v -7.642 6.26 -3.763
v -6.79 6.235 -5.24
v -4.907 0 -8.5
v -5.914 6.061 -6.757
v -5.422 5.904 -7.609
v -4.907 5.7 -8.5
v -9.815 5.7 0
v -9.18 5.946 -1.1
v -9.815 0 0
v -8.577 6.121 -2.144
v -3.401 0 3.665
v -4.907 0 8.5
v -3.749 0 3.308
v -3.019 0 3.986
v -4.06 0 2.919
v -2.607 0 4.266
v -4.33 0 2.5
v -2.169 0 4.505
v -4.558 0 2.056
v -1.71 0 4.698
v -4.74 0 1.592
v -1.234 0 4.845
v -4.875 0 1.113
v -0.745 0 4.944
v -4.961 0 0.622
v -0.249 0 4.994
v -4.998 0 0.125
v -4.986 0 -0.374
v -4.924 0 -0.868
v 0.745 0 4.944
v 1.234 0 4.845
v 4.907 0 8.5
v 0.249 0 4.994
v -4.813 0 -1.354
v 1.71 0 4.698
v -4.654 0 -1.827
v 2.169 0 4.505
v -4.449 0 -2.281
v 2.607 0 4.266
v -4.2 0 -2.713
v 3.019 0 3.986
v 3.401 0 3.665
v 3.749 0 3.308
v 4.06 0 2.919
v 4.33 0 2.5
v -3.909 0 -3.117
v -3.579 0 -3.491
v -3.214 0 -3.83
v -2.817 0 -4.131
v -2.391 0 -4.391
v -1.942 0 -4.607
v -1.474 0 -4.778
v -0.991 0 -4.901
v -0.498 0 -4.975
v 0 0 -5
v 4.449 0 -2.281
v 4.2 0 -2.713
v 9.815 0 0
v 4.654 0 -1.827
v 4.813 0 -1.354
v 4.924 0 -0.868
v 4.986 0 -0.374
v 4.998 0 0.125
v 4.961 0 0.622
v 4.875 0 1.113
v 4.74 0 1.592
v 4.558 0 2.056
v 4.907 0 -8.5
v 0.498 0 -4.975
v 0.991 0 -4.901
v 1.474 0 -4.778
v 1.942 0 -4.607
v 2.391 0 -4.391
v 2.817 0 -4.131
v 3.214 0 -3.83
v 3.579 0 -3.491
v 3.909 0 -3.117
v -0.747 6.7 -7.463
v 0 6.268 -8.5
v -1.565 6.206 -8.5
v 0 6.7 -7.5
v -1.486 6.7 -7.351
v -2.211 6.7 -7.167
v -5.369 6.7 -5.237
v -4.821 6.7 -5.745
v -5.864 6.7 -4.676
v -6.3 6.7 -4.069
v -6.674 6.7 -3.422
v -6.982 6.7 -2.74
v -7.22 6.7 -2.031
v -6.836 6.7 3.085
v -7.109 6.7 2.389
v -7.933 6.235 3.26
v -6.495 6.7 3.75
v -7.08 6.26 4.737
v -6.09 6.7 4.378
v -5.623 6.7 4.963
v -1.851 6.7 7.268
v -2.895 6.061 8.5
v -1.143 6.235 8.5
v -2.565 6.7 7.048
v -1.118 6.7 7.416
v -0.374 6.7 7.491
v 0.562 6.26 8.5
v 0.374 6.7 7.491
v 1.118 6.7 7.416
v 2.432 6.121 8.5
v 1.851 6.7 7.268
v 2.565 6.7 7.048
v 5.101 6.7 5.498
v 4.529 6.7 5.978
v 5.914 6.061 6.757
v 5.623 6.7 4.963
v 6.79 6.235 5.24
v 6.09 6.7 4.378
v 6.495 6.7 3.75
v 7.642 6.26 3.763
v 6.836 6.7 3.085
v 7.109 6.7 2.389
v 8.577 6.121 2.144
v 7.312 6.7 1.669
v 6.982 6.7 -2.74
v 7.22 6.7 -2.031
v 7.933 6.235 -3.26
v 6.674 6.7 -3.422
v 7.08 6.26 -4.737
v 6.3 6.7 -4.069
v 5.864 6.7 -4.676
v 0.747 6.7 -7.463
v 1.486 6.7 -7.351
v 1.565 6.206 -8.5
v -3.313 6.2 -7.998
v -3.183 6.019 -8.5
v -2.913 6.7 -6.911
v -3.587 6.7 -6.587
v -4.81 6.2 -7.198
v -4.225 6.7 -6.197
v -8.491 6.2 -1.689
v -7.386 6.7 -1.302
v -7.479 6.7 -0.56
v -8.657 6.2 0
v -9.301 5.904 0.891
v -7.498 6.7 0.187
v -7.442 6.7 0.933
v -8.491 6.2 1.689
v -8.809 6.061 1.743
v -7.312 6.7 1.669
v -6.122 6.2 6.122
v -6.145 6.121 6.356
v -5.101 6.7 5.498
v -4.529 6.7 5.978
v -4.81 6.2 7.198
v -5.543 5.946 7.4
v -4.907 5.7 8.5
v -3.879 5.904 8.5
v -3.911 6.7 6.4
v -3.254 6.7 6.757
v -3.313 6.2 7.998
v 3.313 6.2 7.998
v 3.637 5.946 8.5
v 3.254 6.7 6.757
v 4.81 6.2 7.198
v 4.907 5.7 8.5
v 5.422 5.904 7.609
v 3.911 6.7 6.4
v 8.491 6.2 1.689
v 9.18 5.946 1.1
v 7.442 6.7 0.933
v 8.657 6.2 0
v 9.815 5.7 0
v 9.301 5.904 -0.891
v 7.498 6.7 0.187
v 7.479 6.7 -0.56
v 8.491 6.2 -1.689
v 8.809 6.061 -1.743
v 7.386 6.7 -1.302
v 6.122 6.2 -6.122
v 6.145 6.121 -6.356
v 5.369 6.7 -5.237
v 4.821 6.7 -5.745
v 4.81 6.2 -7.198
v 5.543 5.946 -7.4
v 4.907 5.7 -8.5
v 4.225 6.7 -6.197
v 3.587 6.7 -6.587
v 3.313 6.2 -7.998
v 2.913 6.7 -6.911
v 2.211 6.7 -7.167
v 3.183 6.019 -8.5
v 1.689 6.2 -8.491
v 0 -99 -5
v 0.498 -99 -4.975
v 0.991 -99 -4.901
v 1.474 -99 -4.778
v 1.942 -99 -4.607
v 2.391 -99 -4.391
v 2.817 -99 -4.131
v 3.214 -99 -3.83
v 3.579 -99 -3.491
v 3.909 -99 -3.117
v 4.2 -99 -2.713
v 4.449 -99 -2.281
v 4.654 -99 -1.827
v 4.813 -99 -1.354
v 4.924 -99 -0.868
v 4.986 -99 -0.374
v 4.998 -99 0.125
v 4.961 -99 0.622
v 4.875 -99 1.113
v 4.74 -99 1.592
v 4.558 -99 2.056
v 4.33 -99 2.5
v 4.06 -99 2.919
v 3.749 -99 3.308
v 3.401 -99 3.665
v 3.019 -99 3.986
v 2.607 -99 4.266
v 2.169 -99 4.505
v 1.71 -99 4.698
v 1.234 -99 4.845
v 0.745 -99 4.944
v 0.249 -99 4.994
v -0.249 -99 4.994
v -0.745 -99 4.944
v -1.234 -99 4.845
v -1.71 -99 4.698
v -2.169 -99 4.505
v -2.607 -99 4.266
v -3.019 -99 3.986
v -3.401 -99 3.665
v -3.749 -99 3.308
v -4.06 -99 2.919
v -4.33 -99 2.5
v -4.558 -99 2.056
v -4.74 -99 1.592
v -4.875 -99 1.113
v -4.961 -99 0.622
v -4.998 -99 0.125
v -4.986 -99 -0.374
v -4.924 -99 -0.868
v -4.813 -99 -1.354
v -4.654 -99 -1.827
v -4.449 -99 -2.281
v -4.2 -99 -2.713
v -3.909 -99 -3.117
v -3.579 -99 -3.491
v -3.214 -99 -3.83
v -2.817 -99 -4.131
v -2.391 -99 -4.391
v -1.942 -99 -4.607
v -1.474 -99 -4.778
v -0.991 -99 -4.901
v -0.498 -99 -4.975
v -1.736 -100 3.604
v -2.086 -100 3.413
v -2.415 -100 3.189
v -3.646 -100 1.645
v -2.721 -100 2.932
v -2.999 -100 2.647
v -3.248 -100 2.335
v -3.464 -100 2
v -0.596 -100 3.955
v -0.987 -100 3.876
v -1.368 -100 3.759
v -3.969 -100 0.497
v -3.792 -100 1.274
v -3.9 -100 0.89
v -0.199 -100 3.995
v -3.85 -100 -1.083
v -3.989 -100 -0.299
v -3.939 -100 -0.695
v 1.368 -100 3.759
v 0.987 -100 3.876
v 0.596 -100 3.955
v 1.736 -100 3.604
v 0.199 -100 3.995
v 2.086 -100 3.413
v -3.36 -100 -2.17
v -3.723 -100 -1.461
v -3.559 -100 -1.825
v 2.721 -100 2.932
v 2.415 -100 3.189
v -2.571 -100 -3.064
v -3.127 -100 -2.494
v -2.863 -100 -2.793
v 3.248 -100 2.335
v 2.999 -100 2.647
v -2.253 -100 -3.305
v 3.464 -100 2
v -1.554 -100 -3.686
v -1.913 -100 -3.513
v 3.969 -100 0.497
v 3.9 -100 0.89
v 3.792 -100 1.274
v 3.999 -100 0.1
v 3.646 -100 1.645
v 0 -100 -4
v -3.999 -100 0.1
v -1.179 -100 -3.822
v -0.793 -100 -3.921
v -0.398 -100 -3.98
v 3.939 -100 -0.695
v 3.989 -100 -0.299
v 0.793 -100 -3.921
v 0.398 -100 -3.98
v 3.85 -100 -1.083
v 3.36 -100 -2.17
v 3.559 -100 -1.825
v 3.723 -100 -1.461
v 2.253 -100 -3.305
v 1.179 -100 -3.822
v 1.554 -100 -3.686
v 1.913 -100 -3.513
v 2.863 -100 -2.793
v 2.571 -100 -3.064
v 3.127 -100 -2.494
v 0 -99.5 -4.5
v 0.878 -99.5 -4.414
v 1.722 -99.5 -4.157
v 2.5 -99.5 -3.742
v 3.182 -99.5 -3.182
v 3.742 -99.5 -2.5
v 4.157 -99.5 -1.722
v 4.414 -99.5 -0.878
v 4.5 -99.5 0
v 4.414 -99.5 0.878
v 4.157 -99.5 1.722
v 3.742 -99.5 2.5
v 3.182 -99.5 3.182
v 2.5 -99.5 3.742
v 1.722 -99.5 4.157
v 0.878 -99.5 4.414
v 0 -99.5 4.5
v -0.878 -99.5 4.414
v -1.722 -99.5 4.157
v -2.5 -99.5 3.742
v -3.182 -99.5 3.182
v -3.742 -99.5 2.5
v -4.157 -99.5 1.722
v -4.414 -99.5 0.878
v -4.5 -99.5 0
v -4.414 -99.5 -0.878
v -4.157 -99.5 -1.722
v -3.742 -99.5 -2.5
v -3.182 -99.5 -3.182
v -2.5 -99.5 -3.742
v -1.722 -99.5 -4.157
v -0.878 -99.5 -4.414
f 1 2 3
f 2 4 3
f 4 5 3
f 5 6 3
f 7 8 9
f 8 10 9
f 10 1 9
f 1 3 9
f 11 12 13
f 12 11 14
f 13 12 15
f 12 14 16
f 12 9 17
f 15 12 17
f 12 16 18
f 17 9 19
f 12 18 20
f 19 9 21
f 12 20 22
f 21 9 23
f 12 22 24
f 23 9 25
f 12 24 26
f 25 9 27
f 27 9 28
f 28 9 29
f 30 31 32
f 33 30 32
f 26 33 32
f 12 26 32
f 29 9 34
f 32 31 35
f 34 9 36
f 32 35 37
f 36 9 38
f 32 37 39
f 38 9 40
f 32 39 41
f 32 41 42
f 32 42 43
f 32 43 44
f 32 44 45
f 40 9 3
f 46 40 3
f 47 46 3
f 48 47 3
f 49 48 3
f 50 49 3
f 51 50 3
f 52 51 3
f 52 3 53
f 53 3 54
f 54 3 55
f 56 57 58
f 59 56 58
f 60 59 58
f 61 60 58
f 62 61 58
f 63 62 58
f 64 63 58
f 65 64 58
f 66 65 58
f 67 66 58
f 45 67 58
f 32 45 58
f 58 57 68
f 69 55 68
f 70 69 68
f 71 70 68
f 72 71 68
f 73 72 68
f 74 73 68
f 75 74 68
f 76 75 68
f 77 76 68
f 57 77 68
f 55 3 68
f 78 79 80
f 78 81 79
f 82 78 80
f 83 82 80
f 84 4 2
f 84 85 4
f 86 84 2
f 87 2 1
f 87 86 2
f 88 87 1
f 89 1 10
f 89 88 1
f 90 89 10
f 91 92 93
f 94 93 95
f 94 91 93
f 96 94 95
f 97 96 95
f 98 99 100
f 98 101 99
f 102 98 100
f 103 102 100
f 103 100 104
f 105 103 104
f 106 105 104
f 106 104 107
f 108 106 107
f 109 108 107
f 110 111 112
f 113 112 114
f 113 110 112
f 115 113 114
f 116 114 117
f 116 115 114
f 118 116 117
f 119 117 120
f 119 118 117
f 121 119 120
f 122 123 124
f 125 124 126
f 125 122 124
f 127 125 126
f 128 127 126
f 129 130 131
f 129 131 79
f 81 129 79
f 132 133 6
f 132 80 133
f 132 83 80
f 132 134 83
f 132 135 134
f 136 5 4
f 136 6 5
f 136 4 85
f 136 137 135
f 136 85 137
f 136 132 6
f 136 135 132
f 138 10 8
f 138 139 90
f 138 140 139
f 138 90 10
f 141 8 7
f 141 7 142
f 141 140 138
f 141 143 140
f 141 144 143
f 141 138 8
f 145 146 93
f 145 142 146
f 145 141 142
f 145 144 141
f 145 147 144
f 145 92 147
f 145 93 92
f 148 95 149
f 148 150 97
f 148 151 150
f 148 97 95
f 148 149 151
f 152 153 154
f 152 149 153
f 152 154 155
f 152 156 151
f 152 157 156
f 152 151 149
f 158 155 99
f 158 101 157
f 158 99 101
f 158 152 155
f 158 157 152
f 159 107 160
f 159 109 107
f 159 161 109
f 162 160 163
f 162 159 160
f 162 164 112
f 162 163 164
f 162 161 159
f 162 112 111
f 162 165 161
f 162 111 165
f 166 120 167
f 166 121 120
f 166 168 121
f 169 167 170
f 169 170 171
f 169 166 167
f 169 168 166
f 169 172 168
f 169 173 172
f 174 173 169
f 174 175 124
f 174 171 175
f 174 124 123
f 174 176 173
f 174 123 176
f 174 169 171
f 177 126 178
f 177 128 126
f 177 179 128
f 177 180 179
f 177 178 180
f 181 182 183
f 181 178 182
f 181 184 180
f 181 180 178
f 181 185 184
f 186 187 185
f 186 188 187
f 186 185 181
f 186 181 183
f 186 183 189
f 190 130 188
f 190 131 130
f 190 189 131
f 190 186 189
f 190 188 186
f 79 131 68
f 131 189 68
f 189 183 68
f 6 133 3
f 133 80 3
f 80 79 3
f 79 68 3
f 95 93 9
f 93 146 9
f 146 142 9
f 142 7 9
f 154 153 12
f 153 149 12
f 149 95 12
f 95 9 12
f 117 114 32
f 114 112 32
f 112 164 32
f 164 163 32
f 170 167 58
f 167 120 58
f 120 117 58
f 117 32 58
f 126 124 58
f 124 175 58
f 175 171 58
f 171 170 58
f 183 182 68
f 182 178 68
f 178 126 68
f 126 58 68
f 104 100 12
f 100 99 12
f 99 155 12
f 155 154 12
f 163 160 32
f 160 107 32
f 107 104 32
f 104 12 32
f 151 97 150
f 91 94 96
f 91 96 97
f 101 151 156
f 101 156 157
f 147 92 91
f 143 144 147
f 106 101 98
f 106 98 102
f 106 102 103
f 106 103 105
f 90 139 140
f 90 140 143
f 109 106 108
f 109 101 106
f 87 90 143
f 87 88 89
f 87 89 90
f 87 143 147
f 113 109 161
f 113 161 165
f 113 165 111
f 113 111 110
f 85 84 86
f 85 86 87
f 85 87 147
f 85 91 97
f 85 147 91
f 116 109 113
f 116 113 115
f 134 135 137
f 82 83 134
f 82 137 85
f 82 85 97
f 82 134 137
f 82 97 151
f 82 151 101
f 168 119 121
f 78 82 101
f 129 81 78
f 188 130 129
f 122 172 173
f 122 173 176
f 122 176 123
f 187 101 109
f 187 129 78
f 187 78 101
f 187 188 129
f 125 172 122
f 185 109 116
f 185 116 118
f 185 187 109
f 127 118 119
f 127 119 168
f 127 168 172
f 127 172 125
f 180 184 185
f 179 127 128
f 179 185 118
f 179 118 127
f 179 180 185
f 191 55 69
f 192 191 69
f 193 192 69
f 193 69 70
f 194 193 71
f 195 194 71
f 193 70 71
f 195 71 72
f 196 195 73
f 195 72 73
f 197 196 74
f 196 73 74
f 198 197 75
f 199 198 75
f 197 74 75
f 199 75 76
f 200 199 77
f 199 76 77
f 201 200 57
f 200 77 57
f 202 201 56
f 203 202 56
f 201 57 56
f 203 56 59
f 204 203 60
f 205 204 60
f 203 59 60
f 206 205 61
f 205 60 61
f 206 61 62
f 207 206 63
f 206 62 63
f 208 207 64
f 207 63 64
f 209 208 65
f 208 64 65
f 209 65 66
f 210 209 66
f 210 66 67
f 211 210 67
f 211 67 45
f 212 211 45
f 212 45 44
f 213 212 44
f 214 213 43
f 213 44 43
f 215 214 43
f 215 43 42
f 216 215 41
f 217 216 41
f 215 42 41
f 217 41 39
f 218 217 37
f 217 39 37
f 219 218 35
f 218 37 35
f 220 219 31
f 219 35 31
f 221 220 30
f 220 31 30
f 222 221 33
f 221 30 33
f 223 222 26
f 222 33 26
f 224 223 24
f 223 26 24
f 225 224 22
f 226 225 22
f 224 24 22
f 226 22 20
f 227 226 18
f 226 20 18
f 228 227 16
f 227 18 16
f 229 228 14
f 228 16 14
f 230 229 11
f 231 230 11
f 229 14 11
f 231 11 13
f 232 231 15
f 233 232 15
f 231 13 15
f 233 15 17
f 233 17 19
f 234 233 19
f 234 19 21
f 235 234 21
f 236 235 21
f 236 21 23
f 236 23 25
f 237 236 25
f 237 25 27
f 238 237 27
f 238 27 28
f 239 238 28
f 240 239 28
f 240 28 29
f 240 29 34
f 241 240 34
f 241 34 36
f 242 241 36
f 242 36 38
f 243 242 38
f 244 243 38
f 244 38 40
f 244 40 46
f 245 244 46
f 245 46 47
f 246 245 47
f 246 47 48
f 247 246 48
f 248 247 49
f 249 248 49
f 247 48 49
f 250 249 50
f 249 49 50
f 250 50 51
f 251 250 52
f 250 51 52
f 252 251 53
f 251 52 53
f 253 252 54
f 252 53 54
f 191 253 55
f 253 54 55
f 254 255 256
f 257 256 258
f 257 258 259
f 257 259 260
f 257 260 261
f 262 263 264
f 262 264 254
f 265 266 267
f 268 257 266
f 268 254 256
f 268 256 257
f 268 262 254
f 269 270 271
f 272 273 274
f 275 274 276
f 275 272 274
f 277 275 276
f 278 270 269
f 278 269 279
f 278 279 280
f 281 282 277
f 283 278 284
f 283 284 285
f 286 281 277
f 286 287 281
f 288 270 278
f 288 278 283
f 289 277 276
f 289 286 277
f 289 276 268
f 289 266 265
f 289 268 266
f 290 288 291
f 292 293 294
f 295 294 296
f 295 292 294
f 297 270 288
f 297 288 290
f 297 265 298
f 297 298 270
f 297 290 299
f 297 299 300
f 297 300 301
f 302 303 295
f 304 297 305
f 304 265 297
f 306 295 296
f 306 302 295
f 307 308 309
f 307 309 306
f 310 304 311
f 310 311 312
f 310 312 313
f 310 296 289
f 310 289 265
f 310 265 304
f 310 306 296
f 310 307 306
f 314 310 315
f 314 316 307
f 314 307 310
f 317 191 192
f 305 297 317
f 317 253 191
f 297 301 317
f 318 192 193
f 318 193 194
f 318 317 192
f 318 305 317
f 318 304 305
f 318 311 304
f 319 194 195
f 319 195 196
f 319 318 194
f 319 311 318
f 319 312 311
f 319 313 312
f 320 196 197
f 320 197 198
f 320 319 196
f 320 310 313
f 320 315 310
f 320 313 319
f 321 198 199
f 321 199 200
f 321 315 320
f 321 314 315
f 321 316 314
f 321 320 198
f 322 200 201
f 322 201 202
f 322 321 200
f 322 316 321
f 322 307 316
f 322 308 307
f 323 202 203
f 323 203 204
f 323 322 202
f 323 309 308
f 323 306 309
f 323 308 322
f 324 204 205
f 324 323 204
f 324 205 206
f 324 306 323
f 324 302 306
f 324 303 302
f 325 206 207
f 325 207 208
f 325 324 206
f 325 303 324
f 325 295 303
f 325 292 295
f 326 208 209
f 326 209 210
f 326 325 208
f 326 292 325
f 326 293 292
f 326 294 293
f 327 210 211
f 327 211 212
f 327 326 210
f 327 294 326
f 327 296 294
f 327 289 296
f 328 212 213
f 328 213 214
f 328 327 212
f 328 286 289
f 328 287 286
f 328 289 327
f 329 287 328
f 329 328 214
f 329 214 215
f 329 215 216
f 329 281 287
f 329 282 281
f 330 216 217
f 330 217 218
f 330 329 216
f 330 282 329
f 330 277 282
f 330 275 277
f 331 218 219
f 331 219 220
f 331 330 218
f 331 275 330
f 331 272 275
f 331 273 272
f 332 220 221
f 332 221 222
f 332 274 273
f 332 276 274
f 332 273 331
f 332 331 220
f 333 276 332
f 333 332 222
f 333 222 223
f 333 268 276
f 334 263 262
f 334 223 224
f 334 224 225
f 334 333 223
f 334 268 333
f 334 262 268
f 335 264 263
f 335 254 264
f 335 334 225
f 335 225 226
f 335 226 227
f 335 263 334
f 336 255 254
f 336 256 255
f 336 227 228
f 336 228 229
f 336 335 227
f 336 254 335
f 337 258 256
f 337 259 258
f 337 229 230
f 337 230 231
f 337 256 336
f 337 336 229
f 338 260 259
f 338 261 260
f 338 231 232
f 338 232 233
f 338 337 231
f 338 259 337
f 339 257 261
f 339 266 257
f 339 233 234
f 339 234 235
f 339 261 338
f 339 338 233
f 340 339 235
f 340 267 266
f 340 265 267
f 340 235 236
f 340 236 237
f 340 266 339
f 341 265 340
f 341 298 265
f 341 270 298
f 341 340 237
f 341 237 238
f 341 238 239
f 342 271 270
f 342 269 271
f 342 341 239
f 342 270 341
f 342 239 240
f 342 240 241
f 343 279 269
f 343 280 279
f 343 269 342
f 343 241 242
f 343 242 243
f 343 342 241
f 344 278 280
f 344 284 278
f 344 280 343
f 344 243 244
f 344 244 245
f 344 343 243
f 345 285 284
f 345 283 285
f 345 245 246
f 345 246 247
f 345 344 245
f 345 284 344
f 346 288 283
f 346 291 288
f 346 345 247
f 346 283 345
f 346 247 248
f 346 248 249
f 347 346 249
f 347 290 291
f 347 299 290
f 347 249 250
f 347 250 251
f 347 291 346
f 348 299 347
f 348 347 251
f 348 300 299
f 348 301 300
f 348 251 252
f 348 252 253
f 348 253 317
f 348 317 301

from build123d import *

# Parameters (mm, degrees)
EXTRUDE_1_DEPTH = 6.7
SKETCH_4_R      = 5
EXTRUDE_2_DEPTH = 100
CHAMFER_1_SIZE  = 1


with BuildPart() as part:
    # 草图2 → 凸台-拉伸1 (new body)
    with BuildSketch(Plane(origin=(0, 0, 0), x_dir=(1, 0, 0), z_dir=(0, 1, 0))):
        Polygon((9.814954576, 0), (4.907477288, 8.5), (-4.907477288, 8.5), (-9.814954576, 0), (-4.907477288, -8.5), (4.907477288, -8.5), align=None)
    extrude(amount=EXTRUDE_1_DEPTH)

    # 草图3 → 切除-旋转1 (revolve, cut)
    with BuildSketch(Plane.XY, mode=Mode.PRIVATE) as cut_revolve_1_sk:
        Polygon((-9.814954576, 5.7), (-7.5, 6.7), (-9.814954576, 6.7), align=None)
    revolve(cut_revolve_1_sk.sketch.rotate(Axis((0, 0, 0), (0, 1, 0)), 270), axis=Axis((0, 0, 0), (0, 1, 0)), mode=Mode.SUBTRACT)

    # 草图4 → 凸台-拉伸2 (add)
    with BuildSketch(Plane.XZ):
        with Locations(Location((0, 0, 0), (0, 0, 270))):
            Circle(SKETCH_4_R)
    extrude(amount=EXTRUDE_2_DEPTH)

    # 倒角1
    chamfer_1_edges = [part.edges().sort_by_distance(p)[0] for p in [
        (0, -100, 5),
    ]]
    chamfer(chamfer_1_edges, length=CHAMFER_1_SIZE)


solid = part.part
